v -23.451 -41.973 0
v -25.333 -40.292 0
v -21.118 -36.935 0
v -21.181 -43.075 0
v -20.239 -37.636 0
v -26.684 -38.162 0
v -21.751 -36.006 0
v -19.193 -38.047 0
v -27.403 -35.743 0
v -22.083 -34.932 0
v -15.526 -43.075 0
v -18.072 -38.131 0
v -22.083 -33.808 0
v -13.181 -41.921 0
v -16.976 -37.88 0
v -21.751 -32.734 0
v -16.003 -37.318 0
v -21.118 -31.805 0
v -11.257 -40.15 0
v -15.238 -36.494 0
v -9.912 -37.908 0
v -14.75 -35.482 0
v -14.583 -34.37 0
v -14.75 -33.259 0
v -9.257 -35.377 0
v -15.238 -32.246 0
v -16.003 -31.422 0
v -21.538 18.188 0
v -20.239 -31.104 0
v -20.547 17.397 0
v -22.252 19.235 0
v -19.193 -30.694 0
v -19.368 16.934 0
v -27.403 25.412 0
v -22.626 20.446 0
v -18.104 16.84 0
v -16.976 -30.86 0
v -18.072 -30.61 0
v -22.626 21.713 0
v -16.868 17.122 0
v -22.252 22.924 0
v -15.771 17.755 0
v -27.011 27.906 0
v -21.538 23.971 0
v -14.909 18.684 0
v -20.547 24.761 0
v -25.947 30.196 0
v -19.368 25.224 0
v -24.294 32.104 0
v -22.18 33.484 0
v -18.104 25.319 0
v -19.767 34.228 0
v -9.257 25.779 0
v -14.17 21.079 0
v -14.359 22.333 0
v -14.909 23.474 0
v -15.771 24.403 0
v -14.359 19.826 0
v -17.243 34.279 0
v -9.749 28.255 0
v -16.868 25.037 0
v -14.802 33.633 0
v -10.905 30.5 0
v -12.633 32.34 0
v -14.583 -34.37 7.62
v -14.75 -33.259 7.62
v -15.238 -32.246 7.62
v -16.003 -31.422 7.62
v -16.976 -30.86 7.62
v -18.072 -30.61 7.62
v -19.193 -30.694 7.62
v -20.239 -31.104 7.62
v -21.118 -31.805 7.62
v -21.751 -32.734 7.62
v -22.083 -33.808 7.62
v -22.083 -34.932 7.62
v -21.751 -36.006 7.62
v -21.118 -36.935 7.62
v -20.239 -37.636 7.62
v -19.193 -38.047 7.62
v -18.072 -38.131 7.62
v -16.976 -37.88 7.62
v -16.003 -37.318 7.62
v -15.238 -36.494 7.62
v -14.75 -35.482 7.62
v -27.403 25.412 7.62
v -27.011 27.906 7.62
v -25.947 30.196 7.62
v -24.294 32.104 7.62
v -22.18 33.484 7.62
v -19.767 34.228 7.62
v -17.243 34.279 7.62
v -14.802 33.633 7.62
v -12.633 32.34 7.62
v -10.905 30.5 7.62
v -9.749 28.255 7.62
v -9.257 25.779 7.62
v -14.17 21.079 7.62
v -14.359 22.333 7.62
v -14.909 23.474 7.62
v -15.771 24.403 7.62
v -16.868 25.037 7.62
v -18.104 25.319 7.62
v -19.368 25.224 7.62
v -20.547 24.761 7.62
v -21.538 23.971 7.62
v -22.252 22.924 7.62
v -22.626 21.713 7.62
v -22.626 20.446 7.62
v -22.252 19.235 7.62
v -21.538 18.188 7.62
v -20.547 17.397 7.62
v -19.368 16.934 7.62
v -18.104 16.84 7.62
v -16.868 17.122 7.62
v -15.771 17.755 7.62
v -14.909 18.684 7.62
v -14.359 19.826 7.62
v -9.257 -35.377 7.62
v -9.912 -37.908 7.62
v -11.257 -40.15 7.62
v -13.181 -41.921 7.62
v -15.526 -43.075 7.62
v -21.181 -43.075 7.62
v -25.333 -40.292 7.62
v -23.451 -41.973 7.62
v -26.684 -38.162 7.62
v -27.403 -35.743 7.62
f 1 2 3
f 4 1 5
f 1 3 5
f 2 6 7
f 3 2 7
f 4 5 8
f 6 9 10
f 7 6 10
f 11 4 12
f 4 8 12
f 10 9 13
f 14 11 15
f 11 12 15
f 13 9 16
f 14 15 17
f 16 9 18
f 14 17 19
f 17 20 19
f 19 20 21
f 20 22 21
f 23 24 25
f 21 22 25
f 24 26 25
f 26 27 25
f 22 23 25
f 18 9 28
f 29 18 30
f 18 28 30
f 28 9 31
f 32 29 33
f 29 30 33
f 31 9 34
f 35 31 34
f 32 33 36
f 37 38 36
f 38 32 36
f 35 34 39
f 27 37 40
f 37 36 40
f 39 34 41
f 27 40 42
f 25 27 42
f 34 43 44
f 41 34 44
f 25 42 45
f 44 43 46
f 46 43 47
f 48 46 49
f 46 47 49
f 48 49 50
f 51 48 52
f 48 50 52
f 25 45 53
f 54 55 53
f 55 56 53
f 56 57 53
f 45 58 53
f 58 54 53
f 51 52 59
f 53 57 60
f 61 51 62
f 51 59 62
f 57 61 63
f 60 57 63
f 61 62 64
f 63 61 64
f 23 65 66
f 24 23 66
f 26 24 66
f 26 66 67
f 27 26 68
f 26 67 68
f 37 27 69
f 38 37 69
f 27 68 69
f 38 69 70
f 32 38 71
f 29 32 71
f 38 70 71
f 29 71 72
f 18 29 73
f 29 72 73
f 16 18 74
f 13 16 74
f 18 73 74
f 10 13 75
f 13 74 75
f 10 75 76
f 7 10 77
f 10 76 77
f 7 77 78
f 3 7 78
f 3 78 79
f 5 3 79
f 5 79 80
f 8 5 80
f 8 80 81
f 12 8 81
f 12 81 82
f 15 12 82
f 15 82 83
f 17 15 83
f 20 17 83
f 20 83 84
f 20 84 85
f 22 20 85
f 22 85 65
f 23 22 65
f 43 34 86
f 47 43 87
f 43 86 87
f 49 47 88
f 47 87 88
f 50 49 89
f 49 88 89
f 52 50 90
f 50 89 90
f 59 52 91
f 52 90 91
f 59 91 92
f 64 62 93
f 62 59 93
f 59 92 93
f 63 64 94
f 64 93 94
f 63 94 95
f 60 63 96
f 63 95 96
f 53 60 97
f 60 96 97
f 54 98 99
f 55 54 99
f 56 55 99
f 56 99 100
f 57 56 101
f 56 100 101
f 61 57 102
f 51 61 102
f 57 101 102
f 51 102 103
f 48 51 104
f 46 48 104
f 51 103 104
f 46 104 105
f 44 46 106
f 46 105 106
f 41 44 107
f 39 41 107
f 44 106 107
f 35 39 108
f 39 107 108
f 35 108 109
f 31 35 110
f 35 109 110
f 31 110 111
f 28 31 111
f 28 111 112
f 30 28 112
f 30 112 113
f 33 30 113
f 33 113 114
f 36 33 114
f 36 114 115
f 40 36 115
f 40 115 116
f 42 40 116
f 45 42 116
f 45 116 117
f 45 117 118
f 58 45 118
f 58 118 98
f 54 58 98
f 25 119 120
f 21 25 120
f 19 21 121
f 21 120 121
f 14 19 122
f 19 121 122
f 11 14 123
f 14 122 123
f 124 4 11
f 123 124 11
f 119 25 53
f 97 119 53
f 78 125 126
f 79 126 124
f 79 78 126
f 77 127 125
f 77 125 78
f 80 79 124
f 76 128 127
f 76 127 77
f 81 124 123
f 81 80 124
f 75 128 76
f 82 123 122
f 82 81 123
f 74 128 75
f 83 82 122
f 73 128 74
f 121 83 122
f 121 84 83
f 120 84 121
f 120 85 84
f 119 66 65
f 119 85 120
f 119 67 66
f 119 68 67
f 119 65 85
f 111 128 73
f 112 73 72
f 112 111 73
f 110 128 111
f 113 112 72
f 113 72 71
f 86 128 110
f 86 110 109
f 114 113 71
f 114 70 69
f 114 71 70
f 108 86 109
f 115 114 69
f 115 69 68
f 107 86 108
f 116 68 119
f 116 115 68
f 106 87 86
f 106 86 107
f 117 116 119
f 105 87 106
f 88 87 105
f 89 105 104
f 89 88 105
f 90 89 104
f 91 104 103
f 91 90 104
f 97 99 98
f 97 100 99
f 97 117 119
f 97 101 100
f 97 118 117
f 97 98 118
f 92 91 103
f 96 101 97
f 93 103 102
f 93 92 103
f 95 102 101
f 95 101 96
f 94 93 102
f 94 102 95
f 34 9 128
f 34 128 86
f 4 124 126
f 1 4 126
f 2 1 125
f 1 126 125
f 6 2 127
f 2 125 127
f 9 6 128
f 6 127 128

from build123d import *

# Parameters (mm, degrees)
F0_W     = 18.1465977803
F0_H     = 77.7187608182
F1_DEPTH = 7.62
F3_DEPTH = 25.4
F4_R     = 3.7710052393
F4_R_2   = 4.2515891663
F5_DEPTH = 25.4


with BuildPart() as f1:
    # F0 (on Top) → F1 (new body)
    with BuildSketch(Plane.XY):
        with Locations((-18.3298974298, -4.2158756405)):
            Rectangle(F0_W, F0_H)
    extrude(amount=F1_DEPTH)

    # F2 (on face) → F3 (cut)
    with BuildSketch(Plane.XY.offset(7.62)):
        with BuildLine():
            ThreePointArc((-27.4031963199, 25.4119987424), (-18.5065865257, 34.3413978482), (-9.2565985397, 25.7785971101))
            Line((-9.2565985397, 25.7785971101), (-9.2565985397, 34.6435047686))
            Line((-9.2565985397, 34.6435047686), (-27.4031963199, 34.6435047686))
            Line((-27.4031963199, 34.6435047686), (-27.4031963199, 25.4119987424))
        make_face()
        with BuildLine():
            Line((-27.4031963199, -43.0752560496), (-21.1813880653, -43.0752560496))
            ThreePointArc((-21.1813880653, -43.0752560496), (-25.3327232093, -40.2921749844), (-27.4031963199, -35.7432998717))
            Line((-27.4031963199, -35.7432998717), (-27.4031963199, -43.0752560496))
        make_face()
        with BuildLine():
            Line((-9.2565985397, -43.0752560496), (-9.2565985397, -35.376701504))
            ThreePointArc((-9.2565985397, -35.376701504), (-11.2569593187, -40.150009887), (-15.526485177, -43.0752560496))
            Line((-15.526485177, -43.0752560496), (-9.2565985397, -43.0752560496))
        make_face()
    extrude(amount=-F3_DEPTH, mode=Mode.SUBTRACT)

    # F4 (on face) → F5 (cut)
    with BuildSketch(Plane.XY.offset(7.62)):
        with Locations((-18.3539366212, -34.3700621202)):
            Circle(F4_R)
        with Locations((-18.4215474874, 21.0793800652)):
            Circle(F4_R_2)
    extrude(amount=-F5_DEPTH, mode=Mode.SUBTRACT)


solid = f1.part
